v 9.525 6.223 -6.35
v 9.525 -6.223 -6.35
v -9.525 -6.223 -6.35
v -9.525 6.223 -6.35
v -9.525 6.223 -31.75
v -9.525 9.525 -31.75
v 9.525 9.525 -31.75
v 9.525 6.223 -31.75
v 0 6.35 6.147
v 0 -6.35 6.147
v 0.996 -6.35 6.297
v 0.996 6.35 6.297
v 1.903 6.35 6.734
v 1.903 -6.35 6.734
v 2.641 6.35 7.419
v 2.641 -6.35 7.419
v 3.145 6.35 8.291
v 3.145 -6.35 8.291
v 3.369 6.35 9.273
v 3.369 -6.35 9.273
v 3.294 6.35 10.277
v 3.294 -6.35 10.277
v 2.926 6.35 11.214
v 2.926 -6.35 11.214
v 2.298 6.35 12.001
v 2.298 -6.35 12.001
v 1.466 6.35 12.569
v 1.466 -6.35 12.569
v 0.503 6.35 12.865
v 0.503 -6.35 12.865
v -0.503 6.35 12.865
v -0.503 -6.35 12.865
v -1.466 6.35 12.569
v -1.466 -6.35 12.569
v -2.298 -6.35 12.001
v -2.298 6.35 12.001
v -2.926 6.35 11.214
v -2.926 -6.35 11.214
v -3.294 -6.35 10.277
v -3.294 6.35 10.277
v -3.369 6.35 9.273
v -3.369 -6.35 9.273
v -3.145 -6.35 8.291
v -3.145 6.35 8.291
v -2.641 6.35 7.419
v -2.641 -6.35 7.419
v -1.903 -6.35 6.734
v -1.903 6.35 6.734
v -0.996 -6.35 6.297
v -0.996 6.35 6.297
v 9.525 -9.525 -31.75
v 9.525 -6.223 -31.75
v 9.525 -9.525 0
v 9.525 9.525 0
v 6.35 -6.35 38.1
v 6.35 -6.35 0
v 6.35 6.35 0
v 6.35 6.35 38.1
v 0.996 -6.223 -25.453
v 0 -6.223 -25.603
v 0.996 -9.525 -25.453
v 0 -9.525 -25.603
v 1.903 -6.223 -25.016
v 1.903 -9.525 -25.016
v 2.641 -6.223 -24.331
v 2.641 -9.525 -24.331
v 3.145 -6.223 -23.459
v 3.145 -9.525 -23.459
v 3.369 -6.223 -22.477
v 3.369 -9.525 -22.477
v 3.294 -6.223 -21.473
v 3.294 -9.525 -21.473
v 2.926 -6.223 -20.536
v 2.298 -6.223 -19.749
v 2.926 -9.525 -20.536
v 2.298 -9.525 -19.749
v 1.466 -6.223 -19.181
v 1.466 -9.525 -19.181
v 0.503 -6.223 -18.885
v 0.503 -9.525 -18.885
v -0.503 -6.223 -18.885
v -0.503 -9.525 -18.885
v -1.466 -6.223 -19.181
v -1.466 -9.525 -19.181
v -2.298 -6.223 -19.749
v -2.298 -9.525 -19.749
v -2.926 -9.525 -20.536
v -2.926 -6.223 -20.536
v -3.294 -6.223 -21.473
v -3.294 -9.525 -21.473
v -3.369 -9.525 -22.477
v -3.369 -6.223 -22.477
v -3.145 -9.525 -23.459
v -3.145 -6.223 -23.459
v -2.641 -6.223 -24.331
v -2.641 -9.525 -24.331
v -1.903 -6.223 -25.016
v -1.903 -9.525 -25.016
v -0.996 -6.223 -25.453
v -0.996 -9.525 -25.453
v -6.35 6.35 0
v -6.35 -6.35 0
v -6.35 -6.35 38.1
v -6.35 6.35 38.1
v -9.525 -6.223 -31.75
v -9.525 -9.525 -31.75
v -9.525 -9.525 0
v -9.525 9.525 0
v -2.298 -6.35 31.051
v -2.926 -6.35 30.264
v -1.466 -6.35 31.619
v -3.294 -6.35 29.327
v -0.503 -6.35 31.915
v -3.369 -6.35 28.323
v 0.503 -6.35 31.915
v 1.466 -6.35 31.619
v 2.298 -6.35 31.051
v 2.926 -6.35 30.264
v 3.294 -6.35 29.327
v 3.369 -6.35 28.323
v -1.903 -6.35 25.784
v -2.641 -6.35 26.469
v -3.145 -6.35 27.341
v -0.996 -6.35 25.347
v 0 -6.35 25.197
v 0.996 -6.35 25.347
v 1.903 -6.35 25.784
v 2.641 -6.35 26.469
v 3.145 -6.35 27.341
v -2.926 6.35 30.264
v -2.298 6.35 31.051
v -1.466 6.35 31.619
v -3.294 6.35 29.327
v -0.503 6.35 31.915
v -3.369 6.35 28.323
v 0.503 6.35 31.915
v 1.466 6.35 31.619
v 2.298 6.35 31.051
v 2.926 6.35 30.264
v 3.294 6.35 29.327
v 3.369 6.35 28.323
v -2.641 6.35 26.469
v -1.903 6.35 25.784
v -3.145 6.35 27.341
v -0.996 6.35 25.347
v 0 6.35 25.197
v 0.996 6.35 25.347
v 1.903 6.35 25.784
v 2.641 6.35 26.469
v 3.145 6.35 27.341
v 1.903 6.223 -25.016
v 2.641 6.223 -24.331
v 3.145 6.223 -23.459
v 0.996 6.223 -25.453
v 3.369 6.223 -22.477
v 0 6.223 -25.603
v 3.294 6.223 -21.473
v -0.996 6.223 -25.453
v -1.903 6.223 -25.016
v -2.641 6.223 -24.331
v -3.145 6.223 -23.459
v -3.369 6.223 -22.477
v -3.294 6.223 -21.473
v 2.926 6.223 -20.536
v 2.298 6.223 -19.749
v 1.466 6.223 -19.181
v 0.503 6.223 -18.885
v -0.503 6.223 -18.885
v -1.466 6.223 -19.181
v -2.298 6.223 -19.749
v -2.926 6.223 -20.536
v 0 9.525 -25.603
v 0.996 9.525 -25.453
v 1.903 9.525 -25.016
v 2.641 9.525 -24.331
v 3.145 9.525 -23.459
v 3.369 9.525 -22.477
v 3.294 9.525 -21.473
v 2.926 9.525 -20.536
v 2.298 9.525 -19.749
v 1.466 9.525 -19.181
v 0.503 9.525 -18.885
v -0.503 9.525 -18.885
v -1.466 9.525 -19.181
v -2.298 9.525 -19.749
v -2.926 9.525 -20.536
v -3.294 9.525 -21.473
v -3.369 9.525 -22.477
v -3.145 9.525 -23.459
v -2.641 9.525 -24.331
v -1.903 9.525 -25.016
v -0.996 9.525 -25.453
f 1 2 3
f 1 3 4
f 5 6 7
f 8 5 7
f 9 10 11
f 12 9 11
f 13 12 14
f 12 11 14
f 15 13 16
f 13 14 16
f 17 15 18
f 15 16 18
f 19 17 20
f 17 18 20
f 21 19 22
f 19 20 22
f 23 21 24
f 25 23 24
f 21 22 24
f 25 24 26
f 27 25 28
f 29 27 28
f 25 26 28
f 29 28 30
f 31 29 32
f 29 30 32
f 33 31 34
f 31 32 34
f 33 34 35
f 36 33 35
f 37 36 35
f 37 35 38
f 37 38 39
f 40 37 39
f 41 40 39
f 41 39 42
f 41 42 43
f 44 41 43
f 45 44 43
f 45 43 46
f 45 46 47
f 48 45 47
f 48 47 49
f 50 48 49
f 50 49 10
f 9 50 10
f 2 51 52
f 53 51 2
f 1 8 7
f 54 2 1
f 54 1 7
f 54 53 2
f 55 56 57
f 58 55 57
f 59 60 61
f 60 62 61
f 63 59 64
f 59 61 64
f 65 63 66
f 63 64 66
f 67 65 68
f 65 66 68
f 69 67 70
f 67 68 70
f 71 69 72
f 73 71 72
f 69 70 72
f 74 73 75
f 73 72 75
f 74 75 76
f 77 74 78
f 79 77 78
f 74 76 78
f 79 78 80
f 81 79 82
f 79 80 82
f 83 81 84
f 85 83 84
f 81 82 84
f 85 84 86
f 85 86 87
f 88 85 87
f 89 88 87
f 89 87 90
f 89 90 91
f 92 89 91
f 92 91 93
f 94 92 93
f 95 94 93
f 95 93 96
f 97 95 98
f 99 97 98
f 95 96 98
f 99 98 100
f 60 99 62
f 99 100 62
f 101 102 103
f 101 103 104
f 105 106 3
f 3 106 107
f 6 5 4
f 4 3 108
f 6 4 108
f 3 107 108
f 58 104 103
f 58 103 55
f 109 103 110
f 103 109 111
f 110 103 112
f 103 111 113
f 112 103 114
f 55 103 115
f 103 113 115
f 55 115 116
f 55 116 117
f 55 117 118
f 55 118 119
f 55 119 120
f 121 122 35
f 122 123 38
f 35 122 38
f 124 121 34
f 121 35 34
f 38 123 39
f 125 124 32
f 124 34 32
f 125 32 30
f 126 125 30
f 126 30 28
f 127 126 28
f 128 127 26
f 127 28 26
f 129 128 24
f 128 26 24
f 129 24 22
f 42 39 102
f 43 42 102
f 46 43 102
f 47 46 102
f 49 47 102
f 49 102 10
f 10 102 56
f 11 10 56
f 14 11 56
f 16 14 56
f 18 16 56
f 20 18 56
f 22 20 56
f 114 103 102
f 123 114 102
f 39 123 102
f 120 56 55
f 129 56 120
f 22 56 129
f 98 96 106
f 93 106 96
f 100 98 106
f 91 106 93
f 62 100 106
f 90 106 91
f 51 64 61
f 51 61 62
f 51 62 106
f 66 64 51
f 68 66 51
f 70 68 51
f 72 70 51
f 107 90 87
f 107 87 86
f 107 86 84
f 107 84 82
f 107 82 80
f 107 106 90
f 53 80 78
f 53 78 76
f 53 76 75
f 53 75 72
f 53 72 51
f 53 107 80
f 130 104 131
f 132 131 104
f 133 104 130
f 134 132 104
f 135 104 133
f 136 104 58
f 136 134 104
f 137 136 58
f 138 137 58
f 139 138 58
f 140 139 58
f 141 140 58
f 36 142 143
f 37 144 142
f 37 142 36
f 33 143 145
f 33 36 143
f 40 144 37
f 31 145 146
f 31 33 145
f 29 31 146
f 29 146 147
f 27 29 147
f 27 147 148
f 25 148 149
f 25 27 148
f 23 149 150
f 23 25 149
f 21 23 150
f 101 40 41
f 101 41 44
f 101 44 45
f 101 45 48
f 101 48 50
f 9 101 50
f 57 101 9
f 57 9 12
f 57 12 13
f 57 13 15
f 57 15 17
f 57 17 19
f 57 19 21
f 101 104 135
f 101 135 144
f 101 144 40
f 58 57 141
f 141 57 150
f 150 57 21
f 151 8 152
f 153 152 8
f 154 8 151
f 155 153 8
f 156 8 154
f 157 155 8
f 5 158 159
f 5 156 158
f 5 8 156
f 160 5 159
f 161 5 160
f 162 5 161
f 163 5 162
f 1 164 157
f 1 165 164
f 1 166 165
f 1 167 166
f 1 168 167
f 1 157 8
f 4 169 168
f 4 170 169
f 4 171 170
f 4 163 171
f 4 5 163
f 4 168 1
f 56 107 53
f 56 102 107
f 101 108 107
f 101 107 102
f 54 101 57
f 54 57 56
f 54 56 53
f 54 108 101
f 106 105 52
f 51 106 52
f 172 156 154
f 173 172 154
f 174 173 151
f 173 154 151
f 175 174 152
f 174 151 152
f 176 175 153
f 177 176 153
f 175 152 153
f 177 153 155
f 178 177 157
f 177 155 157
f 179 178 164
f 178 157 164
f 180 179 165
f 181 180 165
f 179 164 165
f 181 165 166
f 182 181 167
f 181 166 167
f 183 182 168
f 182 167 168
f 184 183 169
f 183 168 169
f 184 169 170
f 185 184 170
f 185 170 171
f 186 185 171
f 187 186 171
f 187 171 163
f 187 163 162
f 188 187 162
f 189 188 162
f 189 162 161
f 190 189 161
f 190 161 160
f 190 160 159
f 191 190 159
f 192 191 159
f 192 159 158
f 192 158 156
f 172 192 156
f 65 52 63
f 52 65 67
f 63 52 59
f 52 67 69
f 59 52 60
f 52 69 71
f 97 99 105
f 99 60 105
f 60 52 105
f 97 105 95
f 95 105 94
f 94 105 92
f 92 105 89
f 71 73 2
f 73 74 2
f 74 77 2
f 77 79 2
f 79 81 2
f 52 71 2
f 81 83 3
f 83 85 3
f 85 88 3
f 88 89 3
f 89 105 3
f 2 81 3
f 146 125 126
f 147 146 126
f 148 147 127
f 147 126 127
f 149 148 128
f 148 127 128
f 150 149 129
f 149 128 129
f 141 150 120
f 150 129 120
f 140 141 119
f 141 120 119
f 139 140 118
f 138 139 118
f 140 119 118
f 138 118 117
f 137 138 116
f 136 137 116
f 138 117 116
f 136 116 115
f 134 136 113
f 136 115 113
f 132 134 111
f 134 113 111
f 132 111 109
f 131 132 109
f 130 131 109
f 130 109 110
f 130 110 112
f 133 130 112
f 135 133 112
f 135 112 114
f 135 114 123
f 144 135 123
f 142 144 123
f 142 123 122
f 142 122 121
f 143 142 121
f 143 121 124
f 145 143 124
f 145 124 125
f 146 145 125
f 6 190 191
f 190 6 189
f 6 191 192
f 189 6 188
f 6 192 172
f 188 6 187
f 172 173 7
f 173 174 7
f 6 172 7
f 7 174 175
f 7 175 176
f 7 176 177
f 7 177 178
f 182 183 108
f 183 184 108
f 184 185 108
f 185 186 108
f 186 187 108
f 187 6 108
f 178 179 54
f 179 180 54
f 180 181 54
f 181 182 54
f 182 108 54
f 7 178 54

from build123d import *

# Parameters (mm, degrees)
SKETCH1_W                   = 12.7
SKETCH1_H                   = 12.7
BOSS_EXTRUDE1_DEPTH         = 38.1
SKETCH2_W                   = 19.05
SKETCH2_H                   = 19.05
BOSS_EXTRUDE2_DEPTH         = 31.75
SKETCH3_W                   = 25.4
SKETCH3_H                   = 12.446
CUT_EXTRUDE1_DEPTH          = 44.649033494
F_1_4_CLEARANCE_HOLE1_D     = 6.7564
F_1_4_CLEARANCE_HOLE1_DEPTH = 19.05
F_1_4_CLEARANCE_HOLE1_TIP   = 2.029827343


with BuildPart() as part:
    # Sketch1 → Boss-Extrude1 (new body)
    with BuildSketch(Plane.XY):
        Rectangle(SKETCH1_W, SKETCH1_H)
    extrude(amount=BOSS_EXTRUDE1_DEPTH)

    # Sketch2 → Boss-Extrude2 (add)
    with BuildSketch(Plane.XY):
        Rectangle(SKETCH2_W, SKETCH2_H)
    extrude(amount=-BOSS_EXTRUDE2_DEPTH)

    # Sketch3 → Cut-Extrude1 (cut, through all)
    with BuildSketch(Plane.ZY.offset(9.525)):
        with Locations((-19.05, 0)):
            Rectangle(SKETCH3_W, SKETCH3_H)
    extrude(amount=-CUT_EXTRUDE1_DEPTH, mode=Mode.SUBTRACT)

    # 1/4 Clearance Hole1
    with Locations(Plane(origin=(47.625, 9.525, -52.822499938), x_dir=(0, 0, 1), z_dir=(0, 1, 0))):
        with Locations((30.597499938, -47.625), (62.347499938, -47.625), (81.397499938, -47.625), (196.332499938, -47.625)):
            Hole(F_1_4_CLEARANCE_HOLE1_D / 2, depth=F_1_4_CLEARANCE_HOLE1_DEPTH)
            with Locations((0, 0, -(F_1_4_CLEARANCE_HOLE1_DEPTH + F_1_4_CLEARANCE_HOLE1_TIP / 2))):  # 118° drill point
                Cone(0, F_1_4_CLEARANCE_HOLE1_D / 2, F_1_4_CLEARANCE_HOLE1_TIP, mode=Mode.SUBTRACT)


solid = part.part
